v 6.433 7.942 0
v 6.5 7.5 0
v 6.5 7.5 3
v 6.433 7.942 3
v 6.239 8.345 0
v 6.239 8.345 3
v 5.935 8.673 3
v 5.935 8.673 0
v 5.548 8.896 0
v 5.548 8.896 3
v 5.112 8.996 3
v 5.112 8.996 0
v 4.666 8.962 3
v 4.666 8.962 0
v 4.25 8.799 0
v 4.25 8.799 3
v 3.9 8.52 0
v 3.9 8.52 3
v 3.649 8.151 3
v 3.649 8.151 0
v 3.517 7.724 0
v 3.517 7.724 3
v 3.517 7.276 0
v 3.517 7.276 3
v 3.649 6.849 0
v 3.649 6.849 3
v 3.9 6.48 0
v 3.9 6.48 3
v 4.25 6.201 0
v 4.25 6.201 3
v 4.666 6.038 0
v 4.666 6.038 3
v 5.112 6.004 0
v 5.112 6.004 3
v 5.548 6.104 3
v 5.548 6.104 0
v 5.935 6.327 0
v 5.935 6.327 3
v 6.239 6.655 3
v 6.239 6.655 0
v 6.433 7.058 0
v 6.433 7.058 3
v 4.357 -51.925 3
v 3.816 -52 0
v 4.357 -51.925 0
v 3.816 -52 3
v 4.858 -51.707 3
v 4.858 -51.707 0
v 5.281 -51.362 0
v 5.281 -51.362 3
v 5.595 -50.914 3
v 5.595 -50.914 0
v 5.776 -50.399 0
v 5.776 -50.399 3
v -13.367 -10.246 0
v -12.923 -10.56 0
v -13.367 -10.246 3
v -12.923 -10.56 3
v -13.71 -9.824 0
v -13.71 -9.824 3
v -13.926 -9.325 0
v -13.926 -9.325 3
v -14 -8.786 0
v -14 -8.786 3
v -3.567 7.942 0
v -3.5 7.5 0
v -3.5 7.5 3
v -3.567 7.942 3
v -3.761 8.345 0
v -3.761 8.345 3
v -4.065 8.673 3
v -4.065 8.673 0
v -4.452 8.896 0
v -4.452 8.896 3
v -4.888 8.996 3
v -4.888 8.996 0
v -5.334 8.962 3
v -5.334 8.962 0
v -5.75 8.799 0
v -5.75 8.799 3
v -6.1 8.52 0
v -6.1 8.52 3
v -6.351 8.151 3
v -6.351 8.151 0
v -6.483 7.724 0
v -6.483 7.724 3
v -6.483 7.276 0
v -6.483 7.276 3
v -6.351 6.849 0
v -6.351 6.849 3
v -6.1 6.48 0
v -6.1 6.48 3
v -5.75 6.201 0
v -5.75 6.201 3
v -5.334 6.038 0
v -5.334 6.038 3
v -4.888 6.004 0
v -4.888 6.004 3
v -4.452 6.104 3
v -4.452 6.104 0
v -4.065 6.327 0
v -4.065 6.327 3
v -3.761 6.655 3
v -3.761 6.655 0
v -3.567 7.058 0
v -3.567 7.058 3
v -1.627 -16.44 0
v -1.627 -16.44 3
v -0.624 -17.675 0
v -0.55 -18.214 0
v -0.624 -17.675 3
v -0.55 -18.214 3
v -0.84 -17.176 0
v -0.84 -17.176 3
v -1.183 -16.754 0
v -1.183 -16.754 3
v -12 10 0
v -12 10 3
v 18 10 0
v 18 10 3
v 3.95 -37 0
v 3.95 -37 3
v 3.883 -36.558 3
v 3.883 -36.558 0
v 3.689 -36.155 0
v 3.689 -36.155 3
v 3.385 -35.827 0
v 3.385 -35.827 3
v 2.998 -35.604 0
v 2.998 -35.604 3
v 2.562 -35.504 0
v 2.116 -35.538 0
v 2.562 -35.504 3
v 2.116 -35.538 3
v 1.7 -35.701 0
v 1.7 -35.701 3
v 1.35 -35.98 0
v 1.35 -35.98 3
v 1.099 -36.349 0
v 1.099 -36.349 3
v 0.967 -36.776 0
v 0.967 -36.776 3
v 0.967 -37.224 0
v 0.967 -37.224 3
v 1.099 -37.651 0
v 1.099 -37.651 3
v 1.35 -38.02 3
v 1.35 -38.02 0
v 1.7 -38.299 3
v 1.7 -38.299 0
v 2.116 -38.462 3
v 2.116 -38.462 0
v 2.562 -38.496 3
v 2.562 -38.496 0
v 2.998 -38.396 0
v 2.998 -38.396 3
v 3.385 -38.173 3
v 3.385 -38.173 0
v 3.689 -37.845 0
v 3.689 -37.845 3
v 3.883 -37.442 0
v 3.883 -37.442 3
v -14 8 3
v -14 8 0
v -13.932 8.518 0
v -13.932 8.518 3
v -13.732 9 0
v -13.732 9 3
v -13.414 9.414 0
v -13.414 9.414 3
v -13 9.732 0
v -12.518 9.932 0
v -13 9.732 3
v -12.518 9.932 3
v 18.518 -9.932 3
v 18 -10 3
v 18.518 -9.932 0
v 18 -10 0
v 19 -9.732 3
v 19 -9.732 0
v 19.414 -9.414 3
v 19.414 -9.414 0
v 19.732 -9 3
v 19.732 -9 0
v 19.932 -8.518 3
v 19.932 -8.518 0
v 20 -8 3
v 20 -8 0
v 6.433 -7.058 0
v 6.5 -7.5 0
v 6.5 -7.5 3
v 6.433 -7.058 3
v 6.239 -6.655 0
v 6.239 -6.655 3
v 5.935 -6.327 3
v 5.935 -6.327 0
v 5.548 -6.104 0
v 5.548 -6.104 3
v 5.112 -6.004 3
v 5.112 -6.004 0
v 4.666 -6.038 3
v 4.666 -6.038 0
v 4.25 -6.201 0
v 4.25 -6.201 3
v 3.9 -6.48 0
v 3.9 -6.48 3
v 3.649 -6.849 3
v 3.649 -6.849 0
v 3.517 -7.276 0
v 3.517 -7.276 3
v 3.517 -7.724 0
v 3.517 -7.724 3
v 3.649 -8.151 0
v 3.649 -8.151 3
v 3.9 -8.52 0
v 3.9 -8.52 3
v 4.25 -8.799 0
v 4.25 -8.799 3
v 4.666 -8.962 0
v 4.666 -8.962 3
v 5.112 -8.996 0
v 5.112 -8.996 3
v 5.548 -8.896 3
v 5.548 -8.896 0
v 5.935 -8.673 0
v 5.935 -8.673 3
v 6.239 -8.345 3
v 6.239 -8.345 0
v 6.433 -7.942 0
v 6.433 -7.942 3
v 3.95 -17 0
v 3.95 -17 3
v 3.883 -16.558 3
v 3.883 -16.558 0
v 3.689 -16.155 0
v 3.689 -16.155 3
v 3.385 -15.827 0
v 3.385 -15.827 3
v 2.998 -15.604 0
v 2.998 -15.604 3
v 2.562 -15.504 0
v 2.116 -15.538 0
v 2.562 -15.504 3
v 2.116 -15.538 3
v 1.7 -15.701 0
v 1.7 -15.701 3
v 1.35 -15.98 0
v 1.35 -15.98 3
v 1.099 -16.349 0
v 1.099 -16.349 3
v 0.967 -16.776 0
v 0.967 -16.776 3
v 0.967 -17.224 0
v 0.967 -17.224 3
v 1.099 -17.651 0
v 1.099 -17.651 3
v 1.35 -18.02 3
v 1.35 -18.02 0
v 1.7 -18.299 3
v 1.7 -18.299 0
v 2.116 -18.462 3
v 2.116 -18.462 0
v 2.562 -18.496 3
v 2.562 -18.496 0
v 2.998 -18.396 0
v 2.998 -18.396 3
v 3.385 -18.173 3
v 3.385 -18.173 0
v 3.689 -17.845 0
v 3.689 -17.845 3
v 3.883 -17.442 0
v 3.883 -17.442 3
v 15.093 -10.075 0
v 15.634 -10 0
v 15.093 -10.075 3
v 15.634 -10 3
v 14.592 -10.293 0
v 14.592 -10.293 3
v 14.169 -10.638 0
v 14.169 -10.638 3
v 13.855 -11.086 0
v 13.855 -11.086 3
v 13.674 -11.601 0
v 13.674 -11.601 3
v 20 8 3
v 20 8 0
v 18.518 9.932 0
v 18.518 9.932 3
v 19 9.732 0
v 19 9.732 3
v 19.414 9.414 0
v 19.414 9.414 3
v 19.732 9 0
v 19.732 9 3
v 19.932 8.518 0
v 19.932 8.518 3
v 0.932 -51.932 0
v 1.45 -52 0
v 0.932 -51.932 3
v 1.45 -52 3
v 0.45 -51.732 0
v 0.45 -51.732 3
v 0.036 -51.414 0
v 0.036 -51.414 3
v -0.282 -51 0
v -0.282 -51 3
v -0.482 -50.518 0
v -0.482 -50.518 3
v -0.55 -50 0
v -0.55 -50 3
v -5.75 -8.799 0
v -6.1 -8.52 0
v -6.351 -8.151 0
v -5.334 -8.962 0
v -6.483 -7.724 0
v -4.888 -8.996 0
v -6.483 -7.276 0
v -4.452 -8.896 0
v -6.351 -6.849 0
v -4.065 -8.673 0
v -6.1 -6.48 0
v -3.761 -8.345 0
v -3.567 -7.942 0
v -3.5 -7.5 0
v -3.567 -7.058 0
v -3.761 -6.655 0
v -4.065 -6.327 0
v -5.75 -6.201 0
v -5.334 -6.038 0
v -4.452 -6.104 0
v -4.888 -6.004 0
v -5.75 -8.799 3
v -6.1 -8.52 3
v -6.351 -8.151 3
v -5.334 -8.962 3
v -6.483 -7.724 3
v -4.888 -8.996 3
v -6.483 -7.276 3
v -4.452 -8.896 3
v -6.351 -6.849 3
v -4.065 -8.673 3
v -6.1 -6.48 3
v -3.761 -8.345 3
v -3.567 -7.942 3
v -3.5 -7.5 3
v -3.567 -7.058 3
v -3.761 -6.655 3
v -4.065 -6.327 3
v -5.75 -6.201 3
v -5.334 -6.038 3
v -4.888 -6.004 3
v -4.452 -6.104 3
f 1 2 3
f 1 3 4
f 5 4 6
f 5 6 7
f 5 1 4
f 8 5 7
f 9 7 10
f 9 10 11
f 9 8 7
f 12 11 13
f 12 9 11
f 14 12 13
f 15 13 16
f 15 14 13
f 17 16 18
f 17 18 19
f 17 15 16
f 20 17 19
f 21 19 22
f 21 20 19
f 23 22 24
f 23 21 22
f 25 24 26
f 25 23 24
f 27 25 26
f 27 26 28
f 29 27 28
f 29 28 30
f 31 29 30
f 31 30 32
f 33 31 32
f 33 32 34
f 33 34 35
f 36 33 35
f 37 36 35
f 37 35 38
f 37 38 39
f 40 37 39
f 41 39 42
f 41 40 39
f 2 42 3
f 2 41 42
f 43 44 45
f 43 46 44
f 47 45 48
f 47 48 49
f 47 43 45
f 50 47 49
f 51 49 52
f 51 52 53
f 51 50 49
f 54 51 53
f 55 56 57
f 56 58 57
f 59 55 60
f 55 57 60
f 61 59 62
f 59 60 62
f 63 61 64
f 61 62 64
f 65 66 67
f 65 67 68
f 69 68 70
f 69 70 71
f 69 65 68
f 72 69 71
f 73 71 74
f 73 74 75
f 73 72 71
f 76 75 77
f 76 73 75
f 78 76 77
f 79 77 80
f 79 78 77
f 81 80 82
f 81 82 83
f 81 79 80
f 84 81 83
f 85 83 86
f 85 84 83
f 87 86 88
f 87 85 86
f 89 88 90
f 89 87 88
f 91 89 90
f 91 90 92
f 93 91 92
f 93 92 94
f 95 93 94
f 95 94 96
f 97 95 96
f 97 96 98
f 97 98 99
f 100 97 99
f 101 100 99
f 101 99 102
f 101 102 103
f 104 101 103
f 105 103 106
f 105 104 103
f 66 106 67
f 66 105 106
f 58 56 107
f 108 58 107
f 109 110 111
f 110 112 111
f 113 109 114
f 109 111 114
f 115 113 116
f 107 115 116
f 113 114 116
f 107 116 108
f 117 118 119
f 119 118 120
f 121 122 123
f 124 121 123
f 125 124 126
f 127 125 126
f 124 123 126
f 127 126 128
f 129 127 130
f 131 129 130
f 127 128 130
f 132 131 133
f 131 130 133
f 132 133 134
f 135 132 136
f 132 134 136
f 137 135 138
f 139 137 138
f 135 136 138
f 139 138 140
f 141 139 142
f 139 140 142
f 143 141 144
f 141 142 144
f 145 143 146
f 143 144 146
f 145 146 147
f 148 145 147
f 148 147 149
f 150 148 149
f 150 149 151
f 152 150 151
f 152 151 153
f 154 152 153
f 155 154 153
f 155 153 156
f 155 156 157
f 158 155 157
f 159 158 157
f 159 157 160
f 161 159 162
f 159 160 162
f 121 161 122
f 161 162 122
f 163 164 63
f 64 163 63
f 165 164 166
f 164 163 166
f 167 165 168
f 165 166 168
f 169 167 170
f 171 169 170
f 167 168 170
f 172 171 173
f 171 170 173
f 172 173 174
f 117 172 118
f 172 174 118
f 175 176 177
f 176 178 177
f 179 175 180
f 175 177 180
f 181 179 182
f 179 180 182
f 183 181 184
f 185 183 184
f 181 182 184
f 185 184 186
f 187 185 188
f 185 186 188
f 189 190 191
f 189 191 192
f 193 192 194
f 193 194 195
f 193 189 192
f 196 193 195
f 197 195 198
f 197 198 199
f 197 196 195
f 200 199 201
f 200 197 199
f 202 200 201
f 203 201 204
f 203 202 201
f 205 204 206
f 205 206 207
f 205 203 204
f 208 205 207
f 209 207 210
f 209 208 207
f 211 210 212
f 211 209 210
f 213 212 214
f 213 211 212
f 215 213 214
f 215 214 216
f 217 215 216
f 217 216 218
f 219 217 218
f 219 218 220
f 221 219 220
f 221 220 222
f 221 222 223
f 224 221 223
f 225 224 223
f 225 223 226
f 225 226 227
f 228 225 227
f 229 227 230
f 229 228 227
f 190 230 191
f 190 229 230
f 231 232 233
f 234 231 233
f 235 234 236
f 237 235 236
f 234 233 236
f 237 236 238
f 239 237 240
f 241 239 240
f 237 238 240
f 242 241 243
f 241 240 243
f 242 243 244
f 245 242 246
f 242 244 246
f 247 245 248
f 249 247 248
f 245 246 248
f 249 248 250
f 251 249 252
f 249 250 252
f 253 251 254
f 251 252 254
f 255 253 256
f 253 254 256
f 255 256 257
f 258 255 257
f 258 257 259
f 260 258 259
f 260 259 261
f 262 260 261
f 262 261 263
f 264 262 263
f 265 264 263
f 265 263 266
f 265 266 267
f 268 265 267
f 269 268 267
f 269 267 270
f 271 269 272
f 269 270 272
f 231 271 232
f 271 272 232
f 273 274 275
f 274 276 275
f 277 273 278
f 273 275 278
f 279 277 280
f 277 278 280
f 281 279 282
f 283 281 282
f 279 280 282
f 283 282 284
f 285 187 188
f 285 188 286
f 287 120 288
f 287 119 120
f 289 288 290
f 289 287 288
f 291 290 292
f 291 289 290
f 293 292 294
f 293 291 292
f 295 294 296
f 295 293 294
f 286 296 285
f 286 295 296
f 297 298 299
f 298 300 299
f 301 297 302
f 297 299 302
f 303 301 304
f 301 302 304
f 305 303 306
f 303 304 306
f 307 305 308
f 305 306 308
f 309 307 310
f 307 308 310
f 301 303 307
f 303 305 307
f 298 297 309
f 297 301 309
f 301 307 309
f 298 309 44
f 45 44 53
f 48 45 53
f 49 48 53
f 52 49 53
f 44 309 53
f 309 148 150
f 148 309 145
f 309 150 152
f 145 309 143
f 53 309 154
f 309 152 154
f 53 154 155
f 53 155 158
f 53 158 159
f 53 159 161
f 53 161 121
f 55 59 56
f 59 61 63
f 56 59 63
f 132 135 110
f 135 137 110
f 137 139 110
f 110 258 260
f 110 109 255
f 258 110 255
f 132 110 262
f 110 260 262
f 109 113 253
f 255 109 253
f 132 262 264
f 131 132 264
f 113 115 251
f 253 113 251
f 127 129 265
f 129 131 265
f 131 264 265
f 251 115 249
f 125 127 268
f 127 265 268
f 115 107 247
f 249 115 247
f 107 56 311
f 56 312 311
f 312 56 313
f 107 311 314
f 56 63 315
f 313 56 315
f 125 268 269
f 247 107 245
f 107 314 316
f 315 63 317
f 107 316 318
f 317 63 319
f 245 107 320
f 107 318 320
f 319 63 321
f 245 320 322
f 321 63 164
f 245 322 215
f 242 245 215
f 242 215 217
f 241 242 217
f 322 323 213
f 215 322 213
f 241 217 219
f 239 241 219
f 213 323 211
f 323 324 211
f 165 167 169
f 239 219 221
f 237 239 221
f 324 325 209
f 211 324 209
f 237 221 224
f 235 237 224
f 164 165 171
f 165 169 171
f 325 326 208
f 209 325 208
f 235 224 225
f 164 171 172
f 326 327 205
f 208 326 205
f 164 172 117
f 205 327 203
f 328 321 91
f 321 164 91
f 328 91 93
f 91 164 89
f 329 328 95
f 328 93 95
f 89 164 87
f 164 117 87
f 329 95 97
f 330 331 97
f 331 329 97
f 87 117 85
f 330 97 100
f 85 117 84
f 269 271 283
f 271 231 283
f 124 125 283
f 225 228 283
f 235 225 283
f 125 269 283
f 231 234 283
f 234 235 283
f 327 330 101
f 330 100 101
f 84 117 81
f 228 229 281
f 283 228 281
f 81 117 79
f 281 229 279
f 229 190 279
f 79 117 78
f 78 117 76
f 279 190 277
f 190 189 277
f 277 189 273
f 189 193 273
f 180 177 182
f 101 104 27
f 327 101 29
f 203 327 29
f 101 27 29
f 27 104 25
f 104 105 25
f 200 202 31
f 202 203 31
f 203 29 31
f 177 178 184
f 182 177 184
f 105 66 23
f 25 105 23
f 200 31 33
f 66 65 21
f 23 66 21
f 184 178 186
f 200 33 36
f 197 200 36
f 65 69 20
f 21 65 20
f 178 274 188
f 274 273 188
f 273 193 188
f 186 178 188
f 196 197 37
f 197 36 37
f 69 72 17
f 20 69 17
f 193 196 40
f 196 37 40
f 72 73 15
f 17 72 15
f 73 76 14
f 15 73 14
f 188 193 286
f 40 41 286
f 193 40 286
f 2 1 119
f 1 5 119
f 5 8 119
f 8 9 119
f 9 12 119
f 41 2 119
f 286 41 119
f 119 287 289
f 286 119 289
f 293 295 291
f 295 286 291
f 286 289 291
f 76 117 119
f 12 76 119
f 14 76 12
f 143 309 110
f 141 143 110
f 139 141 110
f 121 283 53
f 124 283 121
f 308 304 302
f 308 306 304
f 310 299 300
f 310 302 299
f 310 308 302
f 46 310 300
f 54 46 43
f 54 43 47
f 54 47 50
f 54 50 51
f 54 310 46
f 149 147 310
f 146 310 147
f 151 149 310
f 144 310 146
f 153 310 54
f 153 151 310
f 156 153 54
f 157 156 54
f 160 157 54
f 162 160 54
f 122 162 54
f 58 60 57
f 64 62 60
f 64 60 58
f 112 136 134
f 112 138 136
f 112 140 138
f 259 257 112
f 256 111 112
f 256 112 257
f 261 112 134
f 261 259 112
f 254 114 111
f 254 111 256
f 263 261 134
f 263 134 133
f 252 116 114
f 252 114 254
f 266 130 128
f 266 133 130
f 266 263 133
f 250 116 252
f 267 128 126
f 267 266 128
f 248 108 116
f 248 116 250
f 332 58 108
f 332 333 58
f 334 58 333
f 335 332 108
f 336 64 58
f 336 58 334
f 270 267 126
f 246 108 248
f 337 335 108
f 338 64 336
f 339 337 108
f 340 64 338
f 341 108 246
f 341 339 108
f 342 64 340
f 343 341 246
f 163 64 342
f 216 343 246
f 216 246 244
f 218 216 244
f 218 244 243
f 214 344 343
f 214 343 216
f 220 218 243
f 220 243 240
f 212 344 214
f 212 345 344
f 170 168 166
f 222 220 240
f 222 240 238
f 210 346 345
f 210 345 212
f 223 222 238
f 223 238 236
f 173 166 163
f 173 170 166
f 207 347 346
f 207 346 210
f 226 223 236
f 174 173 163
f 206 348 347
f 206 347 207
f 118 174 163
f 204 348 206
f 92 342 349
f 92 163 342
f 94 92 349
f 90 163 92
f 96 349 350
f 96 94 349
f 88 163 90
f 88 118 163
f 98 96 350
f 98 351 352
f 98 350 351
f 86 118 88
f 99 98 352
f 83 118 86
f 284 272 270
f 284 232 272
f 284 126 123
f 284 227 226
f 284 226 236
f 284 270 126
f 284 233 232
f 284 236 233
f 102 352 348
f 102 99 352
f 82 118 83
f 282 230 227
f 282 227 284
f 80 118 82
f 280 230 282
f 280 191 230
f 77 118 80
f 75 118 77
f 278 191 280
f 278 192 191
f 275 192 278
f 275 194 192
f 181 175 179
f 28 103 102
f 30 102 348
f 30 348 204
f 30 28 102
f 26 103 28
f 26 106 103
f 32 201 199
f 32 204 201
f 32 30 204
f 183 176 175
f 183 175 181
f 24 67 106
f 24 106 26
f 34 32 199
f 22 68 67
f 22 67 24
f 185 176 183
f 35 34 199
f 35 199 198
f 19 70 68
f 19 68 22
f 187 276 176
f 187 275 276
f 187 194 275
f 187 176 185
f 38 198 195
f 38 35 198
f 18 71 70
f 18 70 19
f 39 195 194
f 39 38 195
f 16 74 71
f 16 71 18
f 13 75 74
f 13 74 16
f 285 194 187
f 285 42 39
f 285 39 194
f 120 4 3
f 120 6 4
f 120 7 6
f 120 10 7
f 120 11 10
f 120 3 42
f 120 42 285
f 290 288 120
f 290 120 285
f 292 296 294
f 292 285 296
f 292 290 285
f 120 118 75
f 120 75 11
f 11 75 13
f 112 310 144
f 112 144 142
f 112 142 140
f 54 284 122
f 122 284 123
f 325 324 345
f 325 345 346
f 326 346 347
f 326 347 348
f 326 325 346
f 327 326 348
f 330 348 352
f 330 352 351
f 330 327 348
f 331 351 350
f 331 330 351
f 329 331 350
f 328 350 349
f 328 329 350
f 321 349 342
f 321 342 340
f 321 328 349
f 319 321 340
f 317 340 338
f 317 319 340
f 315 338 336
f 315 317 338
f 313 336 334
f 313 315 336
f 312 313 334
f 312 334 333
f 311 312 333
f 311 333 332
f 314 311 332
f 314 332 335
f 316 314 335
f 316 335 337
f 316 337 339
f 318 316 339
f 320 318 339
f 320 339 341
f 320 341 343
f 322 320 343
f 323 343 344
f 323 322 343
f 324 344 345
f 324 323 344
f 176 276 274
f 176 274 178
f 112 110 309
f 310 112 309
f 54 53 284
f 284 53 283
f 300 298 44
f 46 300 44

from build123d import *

# Parameters (mm, degrees)
SKETCH_1_R          = 1.5
EXTRUDE_1_DEPTH     = 3
SKETCH_4_R          = 1.5
CUT_EXTRUDE_1_DEPTH = 3
SKETCH_6_W          = 6
SKETCH_6_H          = 20
EXTRUDE_2_DEPTH     = 3
FILLET_1_R          = 2


with BuildPart() as part:
    # 草图1 → 凸台-拉伸1 (new body)
    with BuildSketch(Plane.XY):
        Polygon((-14, -10), (-0.55, -17), (-0.55, -52), (5.45, -52), (14, -10), (14, 10), (-14, 10), align=None)
        with Locations((5, 7.5)):
            Circle(SKETCH_1_R, mode=Mode.SUBTRACT)
        with Locations((5, -7.5)):
            Circle(SKETCH_1_R, mode=Mode.SUBTRACT)
        with Locations((-5, -7.5)):
            Circle(SKETCH_1_R, mode=Mode.SUBTRACT)
        with Locations((-5, 7.5)):
            Circle(SKETCH_1_R, mode=Mode.SUBTRACT)
    extrude(amount=EXTRUDE_1_DEPTH)

    # 草图4 → 切除-拉伸1 (cut)
    with BuildSketch(Plane.XY.offset(3)):
        with Locations((2.45, -37)):
            Circle(SKETCH_4_R)
        with Locations((2.45, -17)):
            Circle(SKETCH_4_R)
    extrude(amount=-CUT_EXTRUDE_1_DEPTH, mode=Mode.SUBTRACT)

    # 草图6 → 凸台-拉伸2 (add)
    with BuildSketch(Plane.XY.offset(3)):
        with Locations((17, 0)):
            Rectangle(SKETCH_6_W, SKETCH_6_H)
    extrude(amount=-EXTRUDE_2_DEPTH)

    # 圆角1
    fillet_1_edges = [part.edges().sort_by_distance(p)[0] for p in [
        (-0.55, -52, 1.5),
        (-0.55, -17, 1.5),
        (-14, -10, 1.5),
        (-14, 10, 1.5),
        (14, -10, 1.5),
        (5.45, -52, 1.5),
        (20, 10, 1.5),
        (20, -10, 1.5),
    ]]
    fillet(fillet_1_edges, radius=FILLET_1_R)


solid = part.part
